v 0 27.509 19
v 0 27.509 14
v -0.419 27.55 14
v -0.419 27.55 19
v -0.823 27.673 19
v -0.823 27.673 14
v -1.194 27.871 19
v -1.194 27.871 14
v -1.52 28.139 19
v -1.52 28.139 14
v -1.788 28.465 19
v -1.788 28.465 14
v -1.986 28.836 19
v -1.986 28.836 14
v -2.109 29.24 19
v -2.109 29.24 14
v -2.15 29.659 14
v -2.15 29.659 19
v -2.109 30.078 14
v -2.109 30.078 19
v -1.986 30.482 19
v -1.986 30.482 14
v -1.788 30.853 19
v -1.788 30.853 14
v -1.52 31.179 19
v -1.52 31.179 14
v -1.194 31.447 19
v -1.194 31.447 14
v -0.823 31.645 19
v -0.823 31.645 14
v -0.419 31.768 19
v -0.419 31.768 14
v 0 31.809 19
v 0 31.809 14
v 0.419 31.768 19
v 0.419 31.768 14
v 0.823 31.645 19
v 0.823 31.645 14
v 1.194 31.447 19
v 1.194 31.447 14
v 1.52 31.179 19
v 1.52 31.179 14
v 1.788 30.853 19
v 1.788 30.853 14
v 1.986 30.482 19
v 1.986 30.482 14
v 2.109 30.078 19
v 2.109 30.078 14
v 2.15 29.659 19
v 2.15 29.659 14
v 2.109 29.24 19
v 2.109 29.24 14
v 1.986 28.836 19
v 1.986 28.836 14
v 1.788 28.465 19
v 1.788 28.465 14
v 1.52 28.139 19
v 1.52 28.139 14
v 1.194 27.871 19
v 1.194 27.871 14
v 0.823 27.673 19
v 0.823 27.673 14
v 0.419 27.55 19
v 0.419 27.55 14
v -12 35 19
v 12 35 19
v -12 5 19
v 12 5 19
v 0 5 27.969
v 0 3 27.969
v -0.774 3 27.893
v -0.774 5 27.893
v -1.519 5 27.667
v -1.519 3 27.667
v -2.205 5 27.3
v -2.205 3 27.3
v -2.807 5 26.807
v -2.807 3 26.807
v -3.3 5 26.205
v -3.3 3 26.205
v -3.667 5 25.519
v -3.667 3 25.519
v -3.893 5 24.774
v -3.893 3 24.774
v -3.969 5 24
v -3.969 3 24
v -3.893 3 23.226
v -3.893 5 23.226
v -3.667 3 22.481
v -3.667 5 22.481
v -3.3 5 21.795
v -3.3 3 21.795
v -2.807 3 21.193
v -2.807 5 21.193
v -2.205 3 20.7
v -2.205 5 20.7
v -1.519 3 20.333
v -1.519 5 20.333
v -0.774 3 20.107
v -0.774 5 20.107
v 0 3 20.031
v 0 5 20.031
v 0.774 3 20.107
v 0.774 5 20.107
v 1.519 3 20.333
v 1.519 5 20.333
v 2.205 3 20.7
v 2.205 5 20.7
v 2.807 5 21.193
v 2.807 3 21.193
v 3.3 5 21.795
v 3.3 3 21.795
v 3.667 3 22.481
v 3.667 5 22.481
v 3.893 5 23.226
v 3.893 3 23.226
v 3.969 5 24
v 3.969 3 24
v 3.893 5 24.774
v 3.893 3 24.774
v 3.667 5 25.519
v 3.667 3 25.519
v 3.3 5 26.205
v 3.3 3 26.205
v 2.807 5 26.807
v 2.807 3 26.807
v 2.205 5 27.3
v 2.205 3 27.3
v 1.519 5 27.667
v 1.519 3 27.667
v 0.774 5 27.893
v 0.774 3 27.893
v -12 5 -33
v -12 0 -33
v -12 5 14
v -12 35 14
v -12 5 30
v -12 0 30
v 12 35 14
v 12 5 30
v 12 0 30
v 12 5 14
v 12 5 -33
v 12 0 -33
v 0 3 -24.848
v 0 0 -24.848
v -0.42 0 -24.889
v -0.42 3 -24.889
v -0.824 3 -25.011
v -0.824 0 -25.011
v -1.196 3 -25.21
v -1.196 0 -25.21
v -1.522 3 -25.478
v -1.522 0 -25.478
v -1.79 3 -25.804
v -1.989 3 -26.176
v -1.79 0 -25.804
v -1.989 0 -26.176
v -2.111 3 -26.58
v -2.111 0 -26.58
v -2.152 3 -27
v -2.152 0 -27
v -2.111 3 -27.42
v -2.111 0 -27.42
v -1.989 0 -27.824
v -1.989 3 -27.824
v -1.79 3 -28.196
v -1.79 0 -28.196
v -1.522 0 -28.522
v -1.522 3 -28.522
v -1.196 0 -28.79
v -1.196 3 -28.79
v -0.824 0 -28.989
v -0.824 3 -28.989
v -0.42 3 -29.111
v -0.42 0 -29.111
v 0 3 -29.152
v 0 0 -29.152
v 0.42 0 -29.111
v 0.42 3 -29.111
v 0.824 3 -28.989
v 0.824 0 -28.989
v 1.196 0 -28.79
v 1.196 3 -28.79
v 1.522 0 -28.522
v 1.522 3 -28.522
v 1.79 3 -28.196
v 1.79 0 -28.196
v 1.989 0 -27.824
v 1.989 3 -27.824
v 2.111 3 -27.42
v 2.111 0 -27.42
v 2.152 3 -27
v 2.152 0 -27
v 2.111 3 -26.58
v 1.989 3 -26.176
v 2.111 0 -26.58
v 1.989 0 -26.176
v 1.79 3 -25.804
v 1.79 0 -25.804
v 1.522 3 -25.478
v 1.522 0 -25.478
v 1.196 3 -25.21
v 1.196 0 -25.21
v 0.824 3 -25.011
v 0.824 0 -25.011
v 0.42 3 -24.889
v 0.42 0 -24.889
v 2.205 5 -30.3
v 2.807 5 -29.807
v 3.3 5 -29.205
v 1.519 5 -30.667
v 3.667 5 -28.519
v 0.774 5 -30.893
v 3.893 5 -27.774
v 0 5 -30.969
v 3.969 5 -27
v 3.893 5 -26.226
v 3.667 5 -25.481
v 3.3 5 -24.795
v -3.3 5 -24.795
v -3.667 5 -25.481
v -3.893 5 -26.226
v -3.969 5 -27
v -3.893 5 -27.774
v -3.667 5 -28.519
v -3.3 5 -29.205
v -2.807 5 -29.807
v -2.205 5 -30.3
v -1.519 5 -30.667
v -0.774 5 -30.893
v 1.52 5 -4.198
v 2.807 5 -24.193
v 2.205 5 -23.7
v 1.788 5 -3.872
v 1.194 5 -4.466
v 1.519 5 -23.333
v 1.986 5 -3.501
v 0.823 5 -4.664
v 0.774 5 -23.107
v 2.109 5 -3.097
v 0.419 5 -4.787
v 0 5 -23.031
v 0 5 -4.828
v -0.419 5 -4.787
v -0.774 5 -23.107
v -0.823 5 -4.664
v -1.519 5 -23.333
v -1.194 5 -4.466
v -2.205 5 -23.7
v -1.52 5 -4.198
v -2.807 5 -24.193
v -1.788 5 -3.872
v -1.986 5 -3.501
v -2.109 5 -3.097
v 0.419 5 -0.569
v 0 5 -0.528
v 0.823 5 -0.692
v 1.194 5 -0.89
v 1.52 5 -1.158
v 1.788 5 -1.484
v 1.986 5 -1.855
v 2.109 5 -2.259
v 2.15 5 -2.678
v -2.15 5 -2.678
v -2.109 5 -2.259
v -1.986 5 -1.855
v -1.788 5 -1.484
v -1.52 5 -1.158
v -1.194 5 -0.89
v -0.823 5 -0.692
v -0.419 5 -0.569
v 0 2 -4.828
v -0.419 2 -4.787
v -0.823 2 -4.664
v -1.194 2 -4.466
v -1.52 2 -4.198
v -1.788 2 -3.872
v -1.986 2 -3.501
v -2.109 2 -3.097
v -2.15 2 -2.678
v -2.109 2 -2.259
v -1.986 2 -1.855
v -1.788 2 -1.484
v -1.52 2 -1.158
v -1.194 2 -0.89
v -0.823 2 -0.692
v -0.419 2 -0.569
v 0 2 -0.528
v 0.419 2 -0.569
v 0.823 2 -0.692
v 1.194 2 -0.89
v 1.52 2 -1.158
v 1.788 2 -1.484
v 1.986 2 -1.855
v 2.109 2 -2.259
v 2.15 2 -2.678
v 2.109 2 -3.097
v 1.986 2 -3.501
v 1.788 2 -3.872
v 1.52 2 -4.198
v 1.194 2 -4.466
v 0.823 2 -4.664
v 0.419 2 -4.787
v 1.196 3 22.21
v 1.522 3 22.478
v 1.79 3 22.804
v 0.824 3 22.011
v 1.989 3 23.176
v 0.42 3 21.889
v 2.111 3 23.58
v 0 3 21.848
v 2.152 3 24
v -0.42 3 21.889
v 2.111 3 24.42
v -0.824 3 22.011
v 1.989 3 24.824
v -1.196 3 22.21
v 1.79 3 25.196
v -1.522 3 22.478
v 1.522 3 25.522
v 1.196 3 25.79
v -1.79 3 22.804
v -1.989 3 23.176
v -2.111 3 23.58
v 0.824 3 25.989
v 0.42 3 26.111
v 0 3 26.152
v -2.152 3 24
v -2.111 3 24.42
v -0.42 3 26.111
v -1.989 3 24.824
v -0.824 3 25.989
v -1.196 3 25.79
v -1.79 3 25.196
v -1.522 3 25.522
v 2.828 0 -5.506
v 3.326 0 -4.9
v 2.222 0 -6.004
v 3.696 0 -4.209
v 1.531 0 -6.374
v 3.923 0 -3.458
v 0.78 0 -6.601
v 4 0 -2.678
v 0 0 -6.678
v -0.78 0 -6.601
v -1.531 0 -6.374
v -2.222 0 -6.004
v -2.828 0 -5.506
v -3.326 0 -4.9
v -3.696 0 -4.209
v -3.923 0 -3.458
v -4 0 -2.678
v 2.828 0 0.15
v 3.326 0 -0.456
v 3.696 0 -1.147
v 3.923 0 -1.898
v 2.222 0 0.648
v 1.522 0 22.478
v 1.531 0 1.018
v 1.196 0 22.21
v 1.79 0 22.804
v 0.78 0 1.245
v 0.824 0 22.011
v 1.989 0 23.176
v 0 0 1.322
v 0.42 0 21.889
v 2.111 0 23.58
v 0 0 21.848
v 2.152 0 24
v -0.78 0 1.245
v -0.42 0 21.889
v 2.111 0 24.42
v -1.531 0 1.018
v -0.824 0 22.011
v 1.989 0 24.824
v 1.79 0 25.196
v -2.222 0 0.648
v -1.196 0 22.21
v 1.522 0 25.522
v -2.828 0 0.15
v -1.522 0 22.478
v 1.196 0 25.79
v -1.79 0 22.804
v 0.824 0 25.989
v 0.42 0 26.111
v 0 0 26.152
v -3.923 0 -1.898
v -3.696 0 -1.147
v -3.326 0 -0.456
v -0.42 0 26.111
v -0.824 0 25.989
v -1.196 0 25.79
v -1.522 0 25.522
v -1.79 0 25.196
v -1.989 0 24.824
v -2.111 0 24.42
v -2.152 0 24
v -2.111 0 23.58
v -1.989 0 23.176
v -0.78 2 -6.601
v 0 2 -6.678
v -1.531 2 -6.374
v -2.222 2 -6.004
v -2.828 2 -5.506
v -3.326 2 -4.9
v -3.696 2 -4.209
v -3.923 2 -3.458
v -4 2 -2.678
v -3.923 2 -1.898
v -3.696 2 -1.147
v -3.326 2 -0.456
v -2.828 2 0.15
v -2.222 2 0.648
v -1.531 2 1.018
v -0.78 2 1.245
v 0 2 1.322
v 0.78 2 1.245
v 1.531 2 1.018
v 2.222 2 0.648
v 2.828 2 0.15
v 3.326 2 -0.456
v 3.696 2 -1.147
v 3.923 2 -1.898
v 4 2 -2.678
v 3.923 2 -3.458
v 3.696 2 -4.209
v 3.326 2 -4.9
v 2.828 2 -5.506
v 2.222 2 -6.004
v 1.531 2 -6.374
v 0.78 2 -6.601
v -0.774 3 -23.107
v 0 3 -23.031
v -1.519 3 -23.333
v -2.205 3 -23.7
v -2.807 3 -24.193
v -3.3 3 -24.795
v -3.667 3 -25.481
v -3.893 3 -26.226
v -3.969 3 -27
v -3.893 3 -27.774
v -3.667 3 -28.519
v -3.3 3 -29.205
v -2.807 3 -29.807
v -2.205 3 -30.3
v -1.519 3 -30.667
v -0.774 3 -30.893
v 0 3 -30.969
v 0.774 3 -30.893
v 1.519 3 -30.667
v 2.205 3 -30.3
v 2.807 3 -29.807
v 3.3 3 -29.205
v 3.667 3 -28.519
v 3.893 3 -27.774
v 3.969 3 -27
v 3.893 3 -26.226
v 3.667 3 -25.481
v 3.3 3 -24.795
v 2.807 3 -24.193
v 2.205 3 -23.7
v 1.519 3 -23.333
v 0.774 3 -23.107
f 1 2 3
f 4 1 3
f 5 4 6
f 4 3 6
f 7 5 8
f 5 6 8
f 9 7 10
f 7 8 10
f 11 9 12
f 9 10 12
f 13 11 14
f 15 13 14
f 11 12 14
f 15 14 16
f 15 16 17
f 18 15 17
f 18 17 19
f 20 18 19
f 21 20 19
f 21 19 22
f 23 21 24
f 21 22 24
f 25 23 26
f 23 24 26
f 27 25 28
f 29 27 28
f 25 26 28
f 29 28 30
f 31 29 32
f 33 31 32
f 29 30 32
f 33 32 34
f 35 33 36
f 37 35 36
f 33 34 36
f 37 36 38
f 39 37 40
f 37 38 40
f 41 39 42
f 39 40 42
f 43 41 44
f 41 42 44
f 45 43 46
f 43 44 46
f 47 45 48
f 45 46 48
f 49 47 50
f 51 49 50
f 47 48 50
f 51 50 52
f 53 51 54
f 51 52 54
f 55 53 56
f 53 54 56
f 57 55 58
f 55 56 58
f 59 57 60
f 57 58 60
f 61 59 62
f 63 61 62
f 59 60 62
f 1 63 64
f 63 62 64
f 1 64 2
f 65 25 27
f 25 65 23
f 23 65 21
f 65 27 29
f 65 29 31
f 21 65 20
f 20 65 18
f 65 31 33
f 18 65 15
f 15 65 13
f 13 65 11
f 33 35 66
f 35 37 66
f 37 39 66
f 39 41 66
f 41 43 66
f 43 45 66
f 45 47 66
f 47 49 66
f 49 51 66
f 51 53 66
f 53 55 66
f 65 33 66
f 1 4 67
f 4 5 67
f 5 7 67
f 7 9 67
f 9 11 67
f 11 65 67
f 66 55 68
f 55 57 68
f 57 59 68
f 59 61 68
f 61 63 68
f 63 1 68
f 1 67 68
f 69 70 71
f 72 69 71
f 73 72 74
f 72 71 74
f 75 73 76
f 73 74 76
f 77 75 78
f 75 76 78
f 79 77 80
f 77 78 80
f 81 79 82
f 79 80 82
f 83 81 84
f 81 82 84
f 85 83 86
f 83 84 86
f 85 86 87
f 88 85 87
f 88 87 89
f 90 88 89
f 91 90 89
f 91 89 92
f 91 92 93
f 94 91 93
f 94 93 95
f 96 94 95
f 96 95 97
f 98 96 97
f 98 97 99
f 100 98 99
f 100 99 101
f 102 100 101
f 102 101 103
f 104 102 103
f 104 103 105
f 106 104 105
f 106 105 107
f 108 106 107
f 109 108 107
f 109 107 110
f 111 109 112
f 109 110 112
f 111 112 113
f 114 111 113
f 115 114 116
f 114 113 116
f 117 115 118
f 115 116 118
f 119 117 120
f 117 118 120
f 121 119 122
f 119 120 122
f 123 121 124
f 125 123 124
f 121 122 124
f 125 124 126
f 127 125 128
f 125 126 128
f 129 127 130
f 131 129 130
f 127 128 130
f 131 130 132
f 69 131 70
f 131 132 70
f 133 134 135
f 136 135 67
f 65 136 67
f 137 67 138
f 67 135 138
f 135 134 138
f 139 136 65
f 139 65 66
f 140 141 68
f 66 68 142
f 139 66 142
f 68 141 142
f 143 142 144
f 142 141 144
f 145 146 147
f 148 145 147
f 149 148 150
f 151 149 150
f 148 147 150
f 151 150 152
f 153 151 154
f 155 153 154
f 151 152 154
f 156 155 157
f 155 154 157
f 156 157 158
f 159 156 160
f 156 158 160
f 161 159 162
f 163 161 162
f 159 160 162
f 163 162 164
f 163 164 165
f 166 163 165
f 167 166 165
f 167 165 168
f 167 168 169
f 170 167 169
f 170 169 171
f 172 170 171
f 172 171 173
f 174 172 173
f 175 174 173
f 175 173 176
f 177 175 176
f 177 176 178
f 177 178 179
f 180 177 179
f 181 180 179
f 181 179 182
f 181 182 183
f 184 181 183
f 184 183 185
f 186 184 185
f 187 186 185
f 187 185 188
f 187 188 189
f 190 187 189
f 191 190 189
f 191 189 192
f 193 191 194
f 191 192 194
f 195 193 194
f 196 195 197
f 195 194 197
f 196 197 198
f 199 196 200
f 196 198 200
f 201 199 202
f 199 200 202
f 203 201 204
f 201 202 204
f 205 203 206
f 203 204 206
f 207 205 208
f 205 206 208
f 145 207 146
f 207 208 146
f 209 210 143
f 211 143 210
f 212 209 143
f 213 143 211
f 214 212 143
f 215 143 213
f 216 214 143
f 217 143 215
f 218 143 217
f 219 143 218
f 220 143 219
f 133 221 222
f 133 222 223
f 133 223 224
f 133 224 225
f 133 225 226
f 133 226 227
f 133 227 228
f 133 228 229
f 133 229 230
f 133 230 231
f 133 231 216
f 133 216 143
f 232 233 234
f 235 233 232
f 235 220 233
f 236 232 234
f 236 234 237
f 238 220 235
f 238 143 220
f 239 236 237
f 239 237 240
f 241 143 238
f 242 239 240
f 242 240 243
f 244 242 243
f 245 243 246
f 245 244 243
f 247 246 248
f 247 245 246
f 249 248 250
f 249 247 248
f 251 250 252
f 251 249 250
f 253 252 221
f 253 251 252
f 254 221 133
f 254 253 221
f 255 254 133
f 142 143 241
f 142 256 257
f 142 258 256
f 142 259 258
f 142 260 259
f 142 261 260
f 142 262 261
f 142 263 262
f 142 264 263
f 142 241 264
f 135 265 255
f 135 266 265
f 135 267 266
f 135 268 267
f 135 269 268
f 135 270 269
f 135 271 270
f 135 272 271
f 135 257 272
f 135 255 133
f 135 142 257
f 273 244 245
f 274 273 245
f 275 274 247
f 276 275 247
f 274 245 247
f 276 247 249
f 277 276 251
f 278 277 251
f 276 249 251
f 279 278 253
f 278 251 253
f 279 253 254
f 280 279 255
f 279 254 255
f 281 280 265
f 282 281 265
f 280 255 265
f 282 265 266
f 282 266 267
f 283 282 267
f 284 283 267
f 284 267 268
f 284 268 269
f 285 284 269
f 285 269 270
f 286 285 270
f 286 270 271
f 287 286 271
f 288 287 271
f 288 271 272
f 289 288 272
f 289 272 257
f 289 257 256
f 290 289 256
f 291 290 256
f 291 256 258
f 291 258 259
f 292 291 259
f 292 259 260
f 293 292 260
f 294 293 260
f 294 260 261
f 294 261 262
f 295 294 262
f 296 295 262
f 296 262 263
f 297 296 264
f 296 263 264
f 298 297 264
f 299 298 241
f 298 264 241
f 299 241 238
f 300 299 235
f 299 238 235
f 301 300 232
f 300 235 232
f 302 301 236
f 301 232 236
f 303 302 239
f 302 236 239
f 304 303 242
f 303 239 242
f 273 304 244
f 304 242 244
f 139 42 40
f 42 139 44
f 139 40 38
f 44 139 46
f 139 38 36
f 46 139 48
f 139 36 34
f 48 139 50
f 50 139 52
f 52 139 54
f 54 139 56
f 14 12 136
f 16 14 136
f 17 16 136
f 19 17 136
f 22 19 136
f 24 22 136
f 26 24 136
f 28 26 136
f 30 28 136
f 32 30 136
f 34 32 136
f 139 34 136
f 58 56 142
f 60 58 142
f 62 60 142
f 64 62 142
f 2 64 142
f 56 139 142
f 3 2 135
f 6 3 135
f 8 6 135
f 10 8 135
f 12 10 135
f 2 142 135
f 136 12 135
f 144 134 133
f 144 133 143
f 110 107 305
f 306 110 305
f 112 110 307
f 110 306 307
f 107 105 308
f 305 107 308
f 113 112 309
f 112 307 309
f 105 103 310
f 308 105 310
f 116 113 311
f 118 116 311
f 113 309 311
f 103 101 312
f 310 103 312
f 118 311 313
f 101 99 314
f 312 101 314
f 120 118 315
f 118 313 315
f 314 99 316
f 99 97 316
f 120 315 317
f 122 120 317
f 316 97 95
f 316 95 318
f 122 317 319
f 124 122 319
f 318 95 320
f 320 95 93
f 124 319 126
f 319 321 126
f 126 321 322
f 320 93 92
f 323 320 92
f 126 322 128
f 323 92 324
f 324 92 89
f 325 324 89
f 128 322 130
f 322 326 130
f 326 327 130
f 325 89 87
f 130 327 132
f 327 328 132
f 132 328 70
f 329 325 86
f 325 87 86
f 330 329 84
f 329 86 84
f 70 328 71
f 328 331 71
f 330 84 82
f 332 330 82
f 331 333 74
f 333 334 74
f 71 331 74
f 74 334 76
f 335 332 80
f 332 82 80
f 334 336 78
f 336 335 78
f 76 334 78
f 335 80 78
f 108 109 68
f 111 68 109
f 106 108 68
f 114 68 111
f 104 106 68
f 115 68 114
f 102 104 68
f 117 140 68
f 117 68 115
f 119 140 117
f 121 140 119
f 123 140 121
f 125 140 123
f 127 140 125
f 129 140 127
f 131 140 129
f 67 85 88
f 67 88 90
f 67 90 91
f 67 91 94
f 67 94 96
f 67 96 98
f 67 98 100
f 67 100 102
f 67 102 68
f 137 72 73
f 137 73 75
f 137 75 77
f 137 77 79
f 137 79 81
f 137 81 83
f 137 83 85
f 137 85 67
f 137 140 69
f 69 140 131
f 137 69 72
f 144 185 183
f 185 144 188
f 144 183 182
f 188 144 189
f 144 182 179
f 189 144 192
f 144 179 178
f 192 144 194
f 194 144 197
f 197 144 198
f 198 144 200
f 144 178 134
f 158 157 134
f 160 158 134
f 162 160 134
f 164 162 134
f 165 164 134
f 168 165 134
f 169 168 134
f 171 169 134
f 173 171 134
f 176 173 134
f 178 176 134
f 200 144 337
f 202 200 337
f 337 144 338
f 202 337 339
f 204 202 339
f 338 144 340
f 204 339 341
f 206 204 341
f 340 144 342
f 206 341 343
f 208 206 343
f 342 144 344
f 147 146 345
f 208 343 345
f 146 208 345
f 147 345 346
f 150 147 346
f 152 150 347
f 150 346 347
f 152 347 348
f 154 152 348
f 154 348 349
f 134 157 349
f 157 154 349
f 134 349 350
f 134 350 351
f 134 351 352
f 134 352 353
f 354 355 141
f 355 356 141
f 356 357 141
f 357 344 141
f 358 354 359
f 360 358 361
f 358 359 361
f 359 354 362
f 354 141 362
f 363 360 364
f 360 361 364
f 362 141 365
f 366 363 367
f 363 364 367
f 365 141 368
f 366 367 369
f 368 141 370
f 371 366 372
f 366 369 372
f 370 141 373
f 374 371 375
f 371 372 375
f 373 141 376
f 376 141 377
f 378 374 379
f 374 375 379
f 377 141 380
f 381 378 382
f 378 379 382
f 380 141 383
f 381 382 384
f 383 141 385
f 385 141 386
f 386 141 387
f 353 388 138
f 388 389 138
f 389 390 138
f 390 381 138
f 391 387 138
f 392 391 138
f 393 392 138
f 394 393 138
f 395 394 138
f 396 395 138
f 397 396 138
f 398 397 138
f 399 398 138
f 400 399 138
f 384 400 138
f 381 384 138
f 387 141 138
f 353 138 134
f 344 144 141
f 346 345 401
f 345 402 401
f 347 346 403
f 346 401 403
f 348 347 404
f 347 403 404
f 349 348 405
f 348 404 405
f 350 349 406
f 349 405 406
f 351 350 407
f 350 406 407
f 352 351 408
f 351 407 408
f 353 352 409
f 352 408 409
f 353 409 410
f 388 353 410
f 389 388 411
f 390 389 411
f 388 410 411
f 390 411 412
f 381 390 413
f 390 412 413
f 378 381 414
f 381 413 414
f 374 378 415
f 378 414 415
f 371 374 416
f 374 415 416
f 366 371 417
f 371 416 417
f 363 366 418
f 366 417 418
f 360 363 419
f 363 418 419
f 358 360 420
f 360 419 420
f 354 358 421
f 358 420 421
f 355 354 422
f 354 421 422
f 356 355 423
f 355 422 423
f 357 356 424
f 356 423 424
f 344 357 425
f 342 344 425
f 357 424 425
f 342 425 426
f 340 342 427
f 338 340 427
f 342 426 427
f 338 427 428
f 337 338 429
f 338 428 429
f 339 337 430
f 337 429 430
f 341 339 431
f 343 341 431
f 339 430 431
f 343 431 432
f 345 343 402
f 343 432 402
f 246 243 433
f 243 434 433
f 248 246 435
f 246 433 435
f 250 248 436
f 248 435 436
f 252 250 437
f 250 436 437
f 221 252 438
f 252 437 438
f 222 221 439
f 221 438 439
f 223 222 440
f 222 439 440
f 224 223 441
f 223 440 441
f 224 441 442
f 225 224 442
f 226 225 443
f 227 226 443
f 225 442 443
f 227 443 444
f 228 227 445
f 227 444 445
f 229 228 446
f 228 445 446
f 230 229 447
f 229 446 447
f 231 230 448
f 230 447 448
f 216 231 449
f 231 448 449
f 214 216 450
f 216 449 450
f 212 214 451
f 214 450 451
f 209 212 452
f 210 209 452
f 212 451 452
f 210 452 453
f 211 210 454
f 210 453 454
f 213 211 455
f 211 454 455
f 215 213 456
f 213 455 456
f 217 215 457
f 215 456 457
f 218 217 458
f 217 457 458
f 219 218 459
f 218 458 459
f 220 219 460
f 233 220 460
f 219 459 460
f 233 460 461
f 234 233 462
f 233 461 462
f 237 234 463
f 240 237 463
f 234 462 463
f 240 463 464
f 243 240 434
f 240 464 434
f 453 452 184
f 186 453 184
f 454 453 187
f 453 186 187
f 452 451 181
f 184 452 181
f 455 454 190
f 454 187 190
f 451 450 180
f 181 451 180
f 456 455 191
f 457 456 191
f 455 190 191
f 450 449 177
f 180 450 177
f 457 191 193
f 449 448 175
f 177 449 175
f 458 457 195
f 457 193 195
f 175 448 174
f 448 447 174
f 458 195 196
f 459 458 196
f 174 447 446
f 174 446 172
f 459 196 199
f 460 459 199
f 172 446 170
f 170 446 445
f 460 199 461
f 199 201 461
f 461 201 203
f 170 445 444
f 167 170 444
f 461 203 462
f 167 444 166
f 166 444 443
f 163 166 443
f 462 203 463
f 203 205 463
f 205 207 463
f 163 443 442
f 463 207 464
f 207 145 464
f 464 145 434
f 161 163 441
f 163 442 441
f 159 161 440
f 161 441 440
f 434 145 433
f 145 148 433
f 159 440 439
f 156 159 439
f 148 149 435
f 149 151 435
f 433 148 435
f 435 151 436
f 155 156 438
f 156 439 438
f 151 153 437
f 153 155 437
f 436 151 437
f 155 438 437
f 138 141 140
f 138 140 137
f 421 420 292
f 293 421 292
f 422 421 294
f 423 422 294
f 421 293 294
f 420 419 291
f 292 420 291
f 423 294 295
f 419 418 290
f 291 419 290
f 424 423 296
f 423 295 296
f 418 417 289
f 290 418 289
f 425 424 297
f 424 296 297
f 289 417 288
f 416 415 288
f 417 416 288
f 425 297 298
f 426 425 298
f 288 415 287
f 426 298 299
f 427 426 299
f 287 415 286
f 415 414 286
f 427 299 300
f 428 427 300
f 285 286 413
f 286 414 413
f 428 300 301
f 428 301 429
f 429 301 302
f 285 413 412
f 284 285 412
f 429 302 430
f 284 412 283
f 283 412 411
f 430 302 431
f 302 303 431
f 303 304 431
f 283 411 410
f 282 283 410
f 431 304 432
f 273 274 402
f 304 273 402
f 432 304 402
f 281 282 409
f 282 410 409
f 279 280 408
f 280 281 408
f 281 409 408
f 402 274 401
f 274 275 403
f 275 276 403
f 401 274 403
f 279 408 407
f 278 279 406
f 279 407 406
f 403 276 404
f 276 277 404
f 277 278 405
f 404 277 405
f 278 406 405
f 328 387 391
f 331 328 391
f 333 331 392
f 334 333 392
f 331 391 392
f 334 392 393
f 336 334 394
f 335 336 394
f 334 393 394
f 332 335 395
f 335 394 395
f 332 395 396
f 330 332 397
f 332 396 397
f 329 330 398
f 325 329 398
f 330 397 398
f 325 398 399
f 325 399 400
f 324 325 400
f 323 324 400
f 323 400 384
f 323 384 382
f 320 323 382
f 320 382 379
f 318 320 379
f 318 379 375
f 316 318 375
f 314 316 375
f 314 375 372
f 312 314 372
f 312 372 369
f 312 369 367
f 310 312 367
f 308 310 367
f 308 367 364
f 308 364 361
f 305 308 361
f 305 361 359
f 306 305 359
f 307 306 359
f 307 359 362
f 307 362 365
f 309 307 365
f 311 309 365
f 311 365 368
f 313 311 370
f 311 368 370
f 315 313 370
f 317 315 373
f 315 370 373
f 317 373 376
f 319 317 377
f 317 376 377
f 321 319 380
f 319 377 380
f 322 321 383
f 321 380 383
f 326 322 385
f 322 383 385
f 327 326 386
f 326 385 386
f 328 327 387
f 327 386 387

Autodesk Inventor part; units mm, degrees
ref_plane "YZ Plane" through (0, 0, 0) normal (1, 0, 0) x (0, 1, 0)
ref_plane "XZ Plane" through (0, 0, 0) normal (0, 1, 0) x (-1, 0, 0)
ref_plane "XY Plane" through (0, 0, 0) normal (0, 0, 1) x (1, 0, 0)
sketch "Sketch14" plane through (0, 0, 0) normal (0, 1, 0) x (-1, 0, 0)
  line L0 (12, 14) -> (-12, 14)
  line L1 (-12, 14) -> (-12, -14)
  line L2 (-12, -14) -> (12, -14)
  line L3 (12, -14) -> (12, 14)
  line L4 (12, 14) -> (-12, -14) construction
  line L5 (-12, 14) -> (12, -14) construction
  line L6 (12, 14) -> (-12, 14)
  line L7 (-12, 14) -> (-12, 30)
  line L8 (-12, 30) -> (12, 30)
  line L9 (12, 30) -> (12, 14)
  line L10 (-12, -14) -> (12, -14)
  line L11 (12, -14) -> (12, -33)
  line L12 (12, -33) -> (-12, -33)
  line L13 (-12, -33) -> (-12, -14)
  point P0 (0, 0)
  point P1 (12, -14)
  dimension "d93" = 28
  dimension "d94" = 24
  dimension "d95" = 16
  dimension "d111" = 19
extrude "Extrusion8" add sketch "Sketch14" along normal blind 5
sketch "Sketch17" plane through (0, 5, 0) normal (0, 1, 0) x (1, 0, 0)
  line L0 (-12, -30) -> (12, -30) projected
  line L1 (12, 33) -> (-12, 33) projected
  point P0 (0, 0)
  point P1 (0, 27)
  point P2 (0, -24)
  dimension "d119" = 0
  dimension "d121" = 6
  dimension "d122" = 0
  dimension "d125" = 6
hole "Hole8" at (0, 5, -27) at (0, 5, 24) direction (0, -1, 0) diameter 4.305 end through all counterbore diameter 7.938 counterbore depth 2 clearance for "Socket Head Cap Screw" size "#8" standard "Ansi Unified Screw Threads"
sketch "Sketch18" plane through (0, 5, 0) normal (0, 1, 0) x (1, 0, 0)
  line L0 (12, -30) -> (12, 33) projected
  line L1 (-12, 33) -> (-12, -30) projected
  line L2 (12, -14) -> (-12, -14)
  line L3 (-12, -14) -> (-12, -19)
  line L4 (-12, -19) -> (12, -19)
  line L5 (12, -19) -> (12, -14)
  point P0 (0, 0)
  point P1 (-12, -14)
  dimension "d126" = 5
  dimension "d127" = 14
extrude "Extrusion10" add sketch "Sketch18" along normal blind 30
sketch "Sketch19" plane through (-12, 5, 19) normal (0, 0, 1) x (1, 0, 0)
  line L0 (0, 0) -> (24, 0) projected
  line L1 (0, 0) -> (0, 30) projected
  point P0 (12, -5)
  point P1 (12, 24.659)
  dimension "d138" = 24.659
  dimension "d148" = 12
hole "Hole9" at (0, 29.659, 19) direction (0, 0, -1) diameter 4.3 depth 11.8 clearance for "Socket Head Cap Screw" size "M4" standard "Ansi Metric M Profile"
sketch "Sketch20" plane through (0, 0, 0) normal (0, -1, 0) x (1, 0, 0)
  line L0 (-12, 14) -> (12, 14) projected
  point P0 (0, 0)
  point P1 (0, -2.678)
  dimension "d146" = 16.678
  dimension "d147" = 0
hole "Hole10" at (0, 0, -2.678) direction (0, 1, 0) diameter 4.3 depth 11.8 counterbore diameter 8 counterbore depth 2 clearance for "Socket Head Cap Screw" size "M4" standard "Ansi Metric M Profile"
equation "\"d138\" = a"
equation "\"d146\" = b"
equation "\"LASER_HOLE_HEIGHT\" = 16.7"
equation "\"a\" = 24.659"
equation "\"b\" = 16.678"
properties part number "UEOM L mount Vertical"
